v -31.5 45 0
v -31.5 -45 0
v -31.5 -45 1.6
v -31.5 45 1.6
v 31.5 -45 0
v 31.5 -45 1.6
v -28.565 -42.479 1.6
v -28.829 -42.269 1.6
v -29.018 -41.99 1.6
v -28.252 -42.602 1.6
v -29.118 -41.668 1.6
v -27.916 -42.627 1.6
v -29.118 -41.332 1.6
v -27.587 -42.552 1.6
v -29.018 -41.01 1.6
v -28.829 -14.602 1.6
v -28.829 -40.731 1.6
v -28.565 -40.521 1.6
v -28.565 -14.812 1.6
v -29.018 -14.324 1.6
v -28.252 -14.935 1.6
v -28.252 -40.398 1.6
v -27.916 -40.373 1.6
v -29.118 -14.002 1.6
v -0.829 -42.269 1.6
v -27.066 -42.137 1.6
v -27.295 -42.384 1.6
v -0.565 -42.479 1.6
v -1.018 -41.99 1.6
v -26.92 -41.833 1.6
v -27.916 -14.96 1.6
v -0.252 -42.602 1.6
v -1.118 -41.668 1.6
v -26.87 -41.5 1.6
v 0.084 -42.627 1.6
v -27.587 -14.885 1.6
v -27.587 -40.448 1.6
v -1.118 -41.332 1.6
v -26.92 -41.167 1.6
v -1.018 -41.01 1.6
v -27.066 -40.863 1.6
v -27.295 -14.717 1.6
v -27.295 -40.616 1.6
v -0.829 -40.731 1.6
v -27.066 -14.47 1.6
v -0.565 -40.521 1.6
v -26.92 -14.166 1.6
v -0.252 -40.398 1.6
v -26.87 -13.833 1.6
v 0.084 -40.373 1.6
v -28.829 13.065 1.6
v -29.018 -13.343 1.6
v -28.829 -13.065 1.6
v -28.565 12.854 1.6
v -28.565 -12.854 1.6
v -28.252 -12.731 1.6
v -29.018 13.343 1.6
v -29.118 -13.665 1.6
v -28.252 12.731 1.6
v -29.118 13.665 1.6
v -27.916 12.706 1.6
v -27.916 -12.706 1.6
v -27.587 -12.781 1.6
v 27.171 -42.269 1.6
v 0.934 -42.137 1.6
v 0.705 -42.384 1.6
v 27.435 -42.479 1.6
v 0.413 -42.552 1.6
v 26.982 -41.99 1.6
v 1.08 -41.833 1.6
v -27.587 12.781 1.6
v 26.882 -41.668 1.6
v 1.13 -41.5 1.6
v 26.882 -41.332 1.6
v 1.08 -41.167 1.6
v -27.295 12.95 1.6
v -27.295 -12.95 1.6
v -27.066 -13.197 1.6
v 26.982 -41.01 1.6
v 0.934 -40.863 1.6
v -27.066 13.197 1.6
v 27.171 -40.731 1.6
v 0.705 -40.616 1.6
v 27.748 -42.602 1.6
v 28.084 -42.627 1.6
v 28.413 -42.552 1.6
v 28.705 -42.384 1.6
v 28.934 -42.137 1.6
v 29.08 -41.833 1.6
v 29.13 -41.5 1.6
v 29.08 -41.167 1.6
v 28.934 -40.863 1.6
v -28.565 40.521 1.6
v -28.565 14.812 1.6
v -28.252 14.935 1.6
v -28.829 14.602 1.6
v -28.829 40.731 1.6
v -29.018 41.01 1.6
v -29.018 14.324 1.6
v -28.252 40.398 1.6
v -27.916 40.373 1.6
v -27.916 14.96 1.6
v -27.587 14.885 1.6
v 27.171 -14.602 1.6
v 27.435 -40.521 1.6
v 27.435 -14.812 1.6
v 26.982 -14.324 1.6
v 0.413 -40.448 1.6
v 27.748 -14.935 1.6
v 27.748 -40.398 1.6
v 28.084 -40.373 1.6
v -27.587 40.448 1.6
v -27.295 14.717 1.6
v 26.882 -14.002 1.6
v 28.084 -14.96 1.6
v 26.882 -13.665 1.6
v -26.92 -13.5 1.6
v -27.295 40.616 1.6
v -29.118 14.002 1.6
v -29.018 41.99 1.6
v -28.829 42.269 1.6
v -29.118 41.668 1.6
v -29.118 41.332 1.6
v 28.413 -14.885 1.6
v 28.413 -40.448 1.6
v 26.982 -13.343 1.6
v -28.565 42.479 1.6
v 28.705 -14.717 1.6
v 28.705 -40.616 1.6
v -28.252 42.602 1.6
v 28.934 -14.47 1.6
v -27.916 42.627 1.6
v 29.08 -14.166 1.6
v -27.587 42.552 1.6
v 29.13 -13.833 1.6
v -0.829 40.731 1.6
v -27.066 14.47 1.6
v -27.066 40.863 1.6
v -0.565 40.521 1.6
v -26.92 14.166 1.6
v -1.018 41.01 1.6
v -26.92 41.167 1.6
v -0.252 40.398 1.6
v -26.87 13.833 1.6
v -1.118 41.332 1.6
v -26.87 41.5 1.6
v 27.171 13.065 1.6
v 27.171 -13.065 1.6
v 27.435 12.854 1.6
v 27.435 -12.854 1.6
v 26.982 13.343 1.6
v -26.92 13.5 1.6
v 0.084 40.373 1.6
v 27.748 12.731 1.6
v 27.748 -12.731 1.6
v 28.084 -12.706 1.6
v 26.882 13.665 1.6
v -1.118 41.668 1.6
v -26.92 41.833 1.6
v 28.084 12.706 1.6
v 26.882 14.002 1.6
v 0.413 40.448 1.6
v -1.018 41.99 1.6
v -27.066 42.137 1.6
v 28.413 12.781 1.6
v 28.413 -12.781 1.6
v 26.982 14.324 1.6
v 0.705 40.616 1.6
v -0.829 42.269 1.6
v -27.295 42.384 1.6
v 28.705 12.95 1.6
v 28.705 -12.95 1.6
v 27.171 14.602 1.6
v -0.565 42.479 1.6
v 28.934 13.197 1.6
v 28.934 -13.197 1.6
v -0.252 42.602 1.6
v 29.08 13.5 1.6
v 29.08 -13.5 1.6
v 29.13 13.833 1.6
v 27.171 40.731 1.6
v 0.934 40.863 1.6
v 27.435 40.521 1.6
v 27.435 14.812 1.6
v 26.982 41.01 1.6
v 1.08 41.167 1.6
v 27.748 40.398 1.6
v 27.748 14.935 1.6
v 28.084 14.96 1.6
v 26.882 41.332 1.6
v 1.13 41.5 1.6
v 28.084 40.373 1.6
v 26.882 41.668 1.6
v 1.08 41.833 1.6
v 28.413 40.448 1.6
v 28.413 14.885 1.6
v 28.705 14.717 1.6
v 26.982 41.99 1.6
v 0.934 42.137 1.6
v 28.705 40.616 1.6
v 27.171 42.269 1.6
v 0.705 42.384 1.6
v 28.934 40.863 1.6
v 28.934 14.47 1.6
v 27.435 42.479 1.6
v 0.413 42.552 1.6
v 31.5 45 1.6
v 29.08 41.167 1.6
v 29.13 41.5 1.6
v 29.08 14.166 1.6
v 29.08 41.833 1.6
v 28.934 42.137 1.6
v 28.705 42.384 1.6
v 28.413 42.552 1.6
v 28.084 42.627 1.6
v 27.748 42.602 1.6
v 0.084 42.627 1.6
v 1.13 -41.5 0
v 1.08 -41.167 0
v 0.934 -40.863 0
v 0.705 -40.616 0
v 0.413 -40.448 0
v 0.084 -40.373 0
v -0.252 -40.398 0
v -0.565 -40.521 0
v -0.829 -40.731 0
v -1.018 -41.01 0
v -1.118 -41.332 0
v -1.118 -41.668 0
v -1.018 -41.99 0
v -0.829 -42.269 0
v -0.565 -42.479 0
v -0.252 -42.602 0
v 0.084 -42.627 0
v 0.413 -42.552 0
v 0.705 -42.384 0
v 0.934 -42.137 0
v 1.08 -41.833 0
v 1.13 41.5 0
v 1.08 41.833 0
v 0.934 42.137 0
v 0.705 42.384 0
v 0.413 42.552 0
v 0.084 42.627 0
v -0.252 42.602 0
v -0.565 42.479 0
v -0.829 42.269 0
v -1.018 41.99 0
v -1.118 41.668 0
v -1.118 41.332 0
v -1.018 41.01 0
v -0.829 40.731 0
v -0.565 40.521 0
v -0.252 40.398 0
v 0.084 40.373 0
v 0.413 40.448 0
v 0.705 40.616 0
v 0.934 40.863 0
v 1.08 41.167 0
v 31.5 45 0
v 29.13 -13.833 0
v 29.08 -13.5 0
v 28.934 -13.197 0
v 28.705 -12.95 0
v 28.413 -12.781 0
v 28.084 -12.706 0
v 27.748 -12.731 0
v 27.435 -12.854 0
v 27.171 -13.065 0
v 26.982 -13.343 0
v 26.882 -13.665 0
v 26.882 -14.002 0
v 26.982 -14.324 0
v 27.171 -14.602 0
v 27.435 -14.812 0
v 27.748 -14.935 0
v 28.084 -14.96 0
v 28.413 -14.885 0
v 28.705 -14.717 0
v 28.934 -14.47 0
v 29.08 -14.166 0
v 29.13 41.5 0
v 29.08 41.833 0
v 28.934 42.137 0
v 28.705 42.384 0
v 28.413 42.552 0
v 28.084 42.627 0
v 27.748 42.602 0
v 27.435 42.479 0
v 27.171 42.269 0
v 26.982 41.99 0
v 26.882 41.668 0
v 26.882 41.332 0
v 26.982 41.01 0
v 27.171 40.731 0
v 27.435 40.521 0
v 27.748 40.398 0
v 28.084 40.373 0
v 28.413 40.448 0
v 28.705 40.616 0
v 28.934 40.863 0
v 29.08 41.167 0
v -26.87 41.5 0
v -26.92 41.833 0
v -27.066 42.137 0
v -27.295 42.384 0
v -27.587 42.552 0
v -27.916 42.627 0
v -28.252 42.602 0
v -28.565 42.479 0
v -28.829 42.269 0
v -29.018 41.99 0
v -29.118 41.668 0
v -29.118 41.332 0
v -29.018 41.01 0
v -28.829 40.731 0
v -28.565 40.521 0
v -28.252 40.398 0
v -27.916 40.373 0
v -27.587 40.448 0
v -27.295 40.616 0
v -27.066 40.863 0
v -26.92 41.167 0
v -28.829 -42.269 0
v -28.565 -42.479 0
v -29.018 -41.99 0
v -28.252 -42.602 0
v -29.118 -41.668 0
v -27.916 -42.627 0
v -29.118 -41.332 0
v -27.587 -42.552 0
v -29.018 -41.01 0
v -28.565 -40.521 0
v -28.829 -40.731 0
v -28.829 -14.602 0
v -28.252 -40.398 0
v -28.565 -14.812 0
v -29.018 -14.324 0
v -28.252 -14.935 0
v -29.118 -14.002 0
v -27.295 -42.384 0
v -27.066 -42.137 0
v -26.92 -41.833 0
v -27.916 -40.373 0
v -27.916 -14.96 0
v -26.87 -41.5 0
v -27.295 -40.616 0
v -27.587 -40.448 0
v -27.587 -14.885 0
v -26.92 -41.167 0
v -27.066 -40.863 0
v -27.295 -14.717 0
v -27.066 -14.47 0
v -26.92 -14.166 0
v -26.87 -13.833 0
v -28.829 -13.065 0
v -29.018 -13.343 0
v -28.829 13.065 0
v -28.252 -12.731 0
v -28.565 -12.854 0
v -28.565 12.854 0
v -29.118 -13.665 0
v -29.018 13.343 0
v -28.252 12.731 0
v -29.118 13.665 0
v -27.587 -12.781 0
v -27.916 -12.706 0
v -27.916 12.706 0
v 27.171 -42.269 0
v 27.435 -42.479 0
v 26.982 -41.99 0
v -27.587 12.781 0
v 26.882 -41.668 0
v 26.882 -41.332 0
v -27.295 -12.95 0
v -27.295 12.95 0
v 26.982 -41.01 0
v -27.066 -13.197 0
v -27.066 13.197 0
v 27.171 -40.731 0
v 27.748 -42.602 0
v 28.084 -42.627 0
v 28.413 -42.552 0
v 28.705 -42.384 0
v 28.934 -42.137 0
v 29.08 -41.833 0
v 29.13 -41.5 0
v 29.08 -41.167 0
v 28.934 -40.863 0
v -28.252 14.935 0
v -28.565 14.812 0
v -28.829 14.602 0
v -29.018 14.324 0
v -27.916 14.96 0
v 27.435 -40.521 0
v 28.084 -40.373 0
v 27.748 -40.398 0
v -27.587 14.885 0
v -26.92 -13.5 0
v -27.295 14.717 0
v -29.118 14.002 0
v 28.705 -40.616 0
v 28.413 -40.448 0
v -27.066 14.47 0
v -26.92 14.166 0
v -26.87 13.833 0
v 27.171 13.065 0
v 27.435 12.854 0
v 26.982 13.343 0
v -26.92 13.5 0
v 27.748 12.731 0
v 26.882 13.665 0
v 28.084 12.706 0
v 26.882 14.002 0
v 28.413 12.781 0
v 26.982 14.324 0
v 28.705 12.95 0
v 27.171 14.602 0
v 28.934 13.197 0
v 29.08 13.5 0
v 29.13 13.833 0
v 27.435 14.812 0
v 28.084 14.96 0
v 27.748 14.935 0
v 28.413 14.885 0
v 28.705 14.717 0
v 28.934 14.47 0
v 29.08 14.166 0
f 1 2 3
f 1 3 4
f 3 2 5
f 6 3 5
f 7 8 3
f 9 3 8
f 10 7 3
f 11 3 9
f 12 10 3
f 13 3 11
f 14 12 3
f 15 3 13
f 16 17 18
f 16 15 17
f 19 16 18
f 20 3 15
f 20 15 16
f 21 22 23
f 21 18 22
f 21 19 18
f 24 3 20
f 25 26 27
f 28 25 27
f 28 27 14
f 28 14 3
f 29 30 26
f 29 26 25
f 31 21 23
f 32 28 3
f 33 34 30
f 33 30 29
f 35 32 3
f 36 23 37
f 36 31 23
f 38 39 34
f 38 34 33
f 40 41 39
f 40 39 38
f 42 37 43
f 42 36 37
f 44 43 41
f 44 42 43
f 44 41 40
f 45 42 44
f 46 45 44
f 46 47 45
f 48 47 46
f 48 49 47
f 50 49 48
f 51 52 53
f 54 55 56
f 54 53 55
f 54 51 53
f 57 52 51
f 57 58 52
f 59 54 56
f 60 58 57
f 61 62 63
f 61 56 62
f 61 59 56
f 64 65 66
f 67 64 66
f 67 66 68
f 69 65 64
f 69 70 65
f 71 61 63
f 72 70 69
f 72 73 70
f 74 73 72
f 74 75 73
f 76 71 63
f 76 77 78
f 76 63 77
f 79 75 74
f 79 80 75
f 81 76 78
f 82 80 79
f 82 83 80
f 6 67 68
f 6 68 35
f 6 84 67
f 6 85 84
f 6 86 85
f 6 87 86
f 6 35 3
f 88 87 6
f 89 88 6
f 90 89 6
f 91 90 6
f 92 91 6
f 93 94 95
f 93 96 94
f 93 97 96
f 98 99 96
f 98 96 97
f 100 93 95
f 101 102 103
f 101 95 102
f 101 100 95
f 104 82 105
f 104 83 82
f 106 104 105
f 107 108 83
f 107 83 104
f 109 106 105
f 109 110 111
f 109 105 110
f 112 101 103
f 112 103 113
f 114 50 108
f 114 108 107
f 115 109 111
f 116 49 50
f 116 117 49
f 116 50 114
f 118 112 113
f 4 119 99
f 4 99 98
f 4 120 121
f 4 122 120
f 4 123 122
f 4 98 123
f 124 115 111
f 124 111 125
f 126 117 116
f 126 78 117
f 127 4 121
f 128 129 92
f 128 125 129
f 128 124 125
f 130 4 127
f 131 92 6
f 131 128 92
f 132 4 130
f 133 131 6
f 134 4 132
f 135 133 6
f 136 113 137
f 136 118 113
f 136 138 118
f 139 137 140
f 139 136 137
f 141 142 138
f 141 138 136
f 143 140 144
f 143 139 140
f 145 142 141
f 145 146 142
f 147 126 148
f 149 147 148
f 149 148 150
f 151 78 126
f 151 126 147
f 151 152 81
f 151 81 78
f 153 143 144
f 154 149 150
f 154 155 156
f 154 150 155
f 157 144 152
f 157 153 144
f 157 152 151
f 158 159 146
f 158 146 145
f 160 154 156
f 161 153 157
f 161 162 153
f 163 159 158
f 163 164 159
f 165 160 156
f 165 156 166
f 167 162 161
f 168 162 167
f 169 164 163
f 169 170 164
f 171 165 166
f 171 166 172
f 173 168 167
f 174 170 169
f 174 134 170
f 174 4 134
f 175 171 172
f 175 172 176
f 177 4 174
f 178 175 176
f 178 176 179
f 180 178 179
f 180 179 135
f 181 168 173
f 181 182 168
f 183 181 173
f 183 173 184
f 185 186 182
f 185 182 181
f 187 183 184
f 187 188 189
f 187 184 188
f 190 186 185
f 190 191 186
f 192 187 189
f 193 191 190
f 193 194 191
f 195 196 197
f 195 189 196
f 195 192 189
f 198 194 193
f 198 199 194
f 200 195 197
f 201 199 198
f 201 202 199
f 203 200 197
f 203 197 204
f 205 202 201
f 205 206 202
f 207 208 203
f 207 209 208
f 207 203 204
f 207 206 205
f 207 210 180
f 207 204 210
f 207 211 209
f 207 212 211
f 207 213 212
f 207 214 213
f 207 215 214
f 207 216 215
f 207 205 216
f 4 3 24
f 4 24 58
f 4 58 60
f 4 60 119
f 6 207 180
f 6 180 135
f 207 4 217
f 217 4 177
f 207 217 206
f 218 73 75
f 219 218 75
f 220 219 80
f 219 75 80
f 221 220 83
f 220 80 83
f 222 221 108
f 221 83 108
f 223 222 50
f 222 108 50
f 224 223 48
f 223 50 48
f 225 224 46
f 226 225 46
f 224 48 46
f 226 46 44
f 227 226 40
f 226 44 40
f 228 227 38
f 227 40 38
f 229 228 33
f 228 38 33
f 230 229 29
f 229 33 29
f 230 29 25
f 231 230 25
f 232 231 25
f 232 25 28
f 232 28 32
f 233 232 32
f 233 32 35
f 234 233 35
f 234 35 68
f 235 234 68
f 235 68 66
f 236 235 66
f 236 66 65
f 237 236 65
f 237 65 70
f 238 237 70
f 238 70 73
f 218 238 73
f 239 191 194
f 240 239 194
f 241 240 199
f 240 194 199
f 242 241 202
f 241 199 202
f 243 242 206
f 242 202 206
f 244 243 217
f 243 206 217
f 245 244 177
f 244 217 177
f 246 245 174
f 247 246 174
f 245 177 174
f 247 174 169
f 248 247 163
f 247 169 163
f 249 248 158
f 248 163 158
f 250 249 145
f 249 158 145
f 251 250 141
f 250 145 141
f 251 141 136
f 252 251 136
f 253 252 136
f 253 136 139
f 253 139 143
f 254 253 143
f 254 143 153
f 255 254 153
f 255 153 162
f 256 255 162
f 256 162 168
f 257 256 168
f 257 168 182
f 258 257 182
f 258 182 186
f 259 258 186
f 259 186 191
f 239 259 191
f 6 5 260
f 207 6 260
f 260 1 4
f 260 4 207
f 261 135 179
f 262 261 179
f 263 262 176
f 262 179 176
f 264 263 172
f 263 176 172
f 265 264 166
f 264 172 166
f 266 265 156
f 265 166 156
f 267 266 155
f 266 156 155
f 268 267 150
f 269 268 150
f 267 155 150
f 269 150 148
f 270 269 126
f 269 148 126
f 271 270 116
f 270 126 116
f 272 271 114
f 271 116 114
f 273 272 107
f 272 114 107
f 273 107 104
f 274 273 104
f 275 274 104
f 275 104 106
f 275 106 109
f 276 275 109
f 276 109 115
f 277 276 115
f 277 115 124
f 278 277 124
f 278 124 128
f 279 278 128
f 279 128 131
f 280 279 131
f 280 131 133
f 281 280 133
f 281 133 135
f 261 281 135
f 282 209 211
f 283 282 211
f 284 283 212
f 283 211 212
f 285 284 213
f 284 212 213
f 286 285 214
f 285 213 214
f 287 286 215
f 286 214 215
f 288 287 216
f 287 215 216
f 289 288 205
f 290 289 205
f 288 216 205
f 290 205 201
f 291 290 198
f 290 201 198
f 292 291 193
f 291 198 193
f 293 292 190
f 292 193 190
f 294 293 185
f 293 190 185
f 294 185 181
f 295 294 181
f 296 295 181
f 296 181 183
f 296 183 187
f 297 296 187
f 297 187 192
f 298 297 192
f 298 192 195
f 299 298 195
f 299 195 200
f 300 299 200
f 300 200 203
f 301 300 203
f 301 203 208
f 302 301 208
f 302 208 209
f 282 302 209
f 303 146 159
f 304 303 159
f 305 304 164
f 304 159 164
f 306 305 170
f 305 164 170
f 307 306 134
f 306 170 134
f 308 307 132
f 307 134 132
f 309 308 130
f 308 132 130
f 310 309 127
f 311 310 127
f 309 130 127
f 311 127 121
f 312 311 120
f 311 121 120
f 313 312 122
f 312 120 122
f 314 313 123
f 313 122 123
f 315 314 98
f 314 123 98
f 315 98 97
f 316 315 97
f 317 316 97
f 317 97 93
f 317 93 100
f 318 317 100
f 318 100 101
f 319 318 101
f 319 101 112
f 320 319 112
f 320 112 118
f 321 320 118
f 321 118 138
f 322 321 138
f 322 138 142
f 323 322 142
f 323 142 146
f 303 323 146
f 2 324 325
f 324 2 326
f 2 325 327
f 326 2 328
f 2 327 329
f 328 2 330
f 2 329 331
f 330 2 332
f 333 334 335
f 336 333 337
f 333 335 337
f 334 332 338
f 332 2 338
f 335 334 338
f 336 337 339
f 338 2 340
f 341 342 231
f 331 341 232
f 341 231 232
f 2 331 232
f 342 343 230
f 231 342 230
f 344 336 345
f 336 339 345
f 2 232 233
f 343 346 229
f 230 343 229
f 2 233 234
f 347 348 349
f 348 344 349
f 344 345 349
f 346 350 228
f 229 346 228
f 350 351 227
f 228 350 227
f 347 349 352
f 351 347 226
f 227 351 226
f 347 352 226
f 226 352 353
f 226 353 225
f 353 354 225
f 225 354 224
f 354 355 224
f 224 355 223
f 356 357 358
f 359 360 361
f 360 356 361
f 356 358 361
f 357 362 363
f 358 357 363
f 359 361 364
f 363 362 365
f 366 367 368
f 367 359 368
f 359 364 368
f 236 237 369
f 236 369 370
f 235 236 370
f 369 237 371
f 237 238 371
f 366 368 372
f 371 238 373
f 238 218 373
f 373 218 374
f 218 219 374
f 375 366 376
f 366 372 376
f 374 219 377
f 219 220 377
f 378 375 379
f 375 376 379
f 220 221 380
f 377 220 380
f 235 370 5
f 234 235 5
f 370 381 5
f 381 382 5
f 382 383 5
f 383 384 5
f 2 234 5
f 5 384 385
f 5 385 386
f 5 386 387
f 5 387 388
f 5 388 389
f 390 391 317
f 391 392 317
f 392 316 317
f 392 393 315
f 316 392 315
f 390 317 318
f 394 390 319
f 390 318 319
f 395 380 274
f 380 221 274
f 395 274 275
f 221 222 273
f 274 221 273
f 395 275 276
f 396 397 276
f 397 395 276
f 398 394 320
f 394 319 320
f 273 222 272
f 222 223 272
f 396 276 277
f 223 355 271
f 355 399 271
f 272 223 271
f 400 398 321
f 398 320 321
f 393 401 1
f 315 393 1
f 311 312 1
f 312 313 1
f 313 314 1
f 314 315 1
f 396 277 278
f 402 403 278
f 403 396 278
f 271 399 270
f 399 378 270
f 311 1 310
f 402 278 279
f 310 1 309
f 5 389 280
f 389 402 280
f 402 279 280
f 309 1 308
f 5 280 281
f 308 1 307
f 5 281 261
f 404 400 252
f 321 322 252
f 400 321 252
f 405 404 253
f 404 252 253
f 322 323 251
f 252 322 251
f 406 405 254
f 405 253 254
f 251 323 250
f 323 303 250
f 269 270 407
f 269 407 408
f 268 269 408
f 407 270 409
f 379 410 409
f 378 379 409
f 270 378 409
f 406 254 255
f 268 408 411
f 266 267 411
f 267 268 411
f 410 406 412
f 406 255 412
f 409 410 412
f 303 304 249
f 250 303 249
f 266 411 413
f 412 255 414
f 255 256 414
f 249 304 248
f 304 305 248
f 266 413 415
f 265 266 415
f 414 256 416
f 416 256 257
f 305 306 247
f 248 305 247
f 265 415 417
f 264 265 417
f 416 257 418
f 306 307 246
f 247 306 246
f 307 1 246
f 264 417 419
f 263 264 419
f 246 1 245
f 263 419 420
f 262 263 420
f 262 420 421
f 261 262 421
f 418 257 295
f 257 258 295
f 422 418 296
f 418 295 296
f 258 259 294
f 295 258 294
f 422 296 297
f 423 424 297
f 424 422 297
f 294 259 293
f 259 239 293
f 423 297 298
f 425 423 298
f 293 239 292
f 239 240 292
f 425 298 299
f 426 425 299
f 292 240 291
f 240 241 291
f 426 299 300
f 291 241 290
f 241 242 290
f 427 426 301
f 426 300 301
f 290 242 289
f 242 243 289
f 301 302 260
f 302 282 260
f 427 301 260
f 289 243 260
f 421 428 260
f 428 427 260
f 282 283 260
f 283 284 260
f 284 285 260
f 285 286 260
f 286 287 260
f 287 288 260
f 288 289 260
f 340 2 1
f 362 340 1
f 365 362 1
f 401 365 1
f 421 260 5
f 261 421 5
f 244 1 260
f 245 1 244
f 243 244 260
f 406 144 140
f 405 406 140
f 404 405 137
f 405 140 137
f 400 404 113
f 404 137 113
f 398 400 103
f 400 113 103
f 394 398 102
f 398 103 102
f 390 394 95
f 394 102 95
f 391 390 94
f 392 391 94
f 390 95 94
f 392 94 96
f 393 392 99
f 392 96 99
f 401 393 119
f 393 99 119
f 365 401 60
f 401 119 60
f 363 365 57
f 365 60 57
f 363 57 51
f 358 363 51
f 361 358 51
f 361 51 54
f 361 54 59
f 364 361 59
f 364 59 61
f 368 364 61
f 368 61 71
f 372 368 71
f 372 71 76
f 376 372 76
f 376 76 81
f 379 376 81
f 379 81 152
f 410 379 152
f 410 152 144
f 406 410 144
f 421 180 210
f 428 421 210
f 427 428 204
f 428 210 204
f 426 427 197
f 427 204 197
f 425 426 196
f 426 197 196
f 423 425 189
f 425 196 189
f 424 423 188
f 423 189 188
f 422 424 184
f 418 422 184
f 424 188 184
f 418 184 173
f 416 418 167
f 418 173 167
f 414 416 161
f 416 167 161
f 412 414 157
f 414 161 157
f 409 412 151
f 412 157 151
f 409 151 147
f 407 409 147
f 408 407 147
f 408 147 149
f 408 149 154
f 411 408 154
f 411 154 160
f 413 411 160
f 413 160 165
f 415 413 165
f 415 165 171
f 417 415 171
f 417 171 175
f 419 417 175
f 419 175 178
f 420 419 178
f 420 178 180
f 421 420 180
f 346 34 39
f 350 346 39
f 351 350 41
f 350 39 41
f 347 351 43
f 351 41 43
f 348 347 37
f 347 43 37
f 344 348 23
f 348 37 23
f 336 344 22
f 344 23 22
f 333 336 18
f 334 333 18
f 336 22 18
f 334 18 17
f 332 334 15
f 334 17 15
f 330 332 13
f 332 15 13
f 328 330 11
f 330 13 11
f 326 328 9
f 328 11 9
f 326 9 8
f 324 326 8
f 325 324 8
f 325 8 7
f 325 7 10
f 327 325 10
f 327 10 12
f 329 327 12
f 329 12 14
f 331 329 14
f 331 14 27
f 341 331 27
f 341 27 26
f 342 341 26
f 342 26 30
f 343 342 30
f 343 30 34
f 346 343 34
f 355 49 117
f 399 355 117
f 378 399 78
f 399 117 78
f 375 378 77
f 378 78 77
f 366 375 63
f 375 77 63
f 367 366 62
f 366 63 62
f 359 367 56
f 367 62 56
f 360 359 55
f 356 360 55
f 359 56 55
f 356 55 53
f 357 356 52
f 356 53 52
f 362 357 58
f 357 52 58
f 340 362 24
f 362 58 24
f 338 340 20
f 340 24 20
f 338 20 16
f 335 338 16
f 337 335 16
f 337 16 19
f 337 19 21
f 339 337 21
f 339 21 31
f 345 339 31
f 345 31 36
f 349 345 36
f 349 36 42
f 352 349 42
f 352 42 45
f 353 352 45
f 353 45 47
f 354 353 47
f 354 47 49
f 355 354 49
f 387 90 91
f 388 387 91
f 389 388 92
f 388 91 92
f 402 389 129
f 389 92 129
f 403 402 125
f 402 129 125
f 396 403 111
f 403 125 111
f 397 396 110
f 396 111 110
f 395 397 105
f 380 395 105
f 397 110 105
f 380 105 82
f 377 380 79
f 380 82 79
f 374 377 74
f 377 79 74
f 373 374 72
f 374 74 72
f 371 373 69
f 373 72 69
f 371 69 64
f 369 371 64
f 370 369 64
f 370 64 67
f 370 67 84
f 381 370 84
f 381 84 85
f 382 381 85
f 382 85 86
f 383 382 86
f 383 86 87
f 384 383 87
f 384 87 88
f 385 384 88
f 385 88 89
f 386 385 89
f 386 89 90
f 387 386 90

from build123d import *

# Parameters (mm, degrees)
F0_W     = 63
F0_H     = 90
F1_DEPTH = 1.6
F2_R     = 1.1303
F3_DEPTH = 25


with BuildPart() as f1:
    # F0 (on Top) → F1 (new body)
    with BuildSketch(Plane.XY):
        Rectangle(F0_W, F0_H)
    extrude(amount=F1_DEPTH)

    # F2 (on face) → F3 (cut)
    with BuildSketch(Plane.XY.offset(1.6)):
        with Locations((-28, 41.5)):
            Circle(F2_R)
        with Locations((0, 41.5)):
            Circle(F2_R)
        with Locations((28, 41.5)):
            Circle(F2_R)
        with Locations((28, 13.833333)):
            Circle(F2_R)
        with Locations((28, -13.833333)):
            Circle(F2_R)
        with Locations((0, -41.5)):
            Circle(F2_R)
        with Locations((-28, -41.5)):
            Circle(F2_R)
        with Locations((-28, -13.833333)):
            Circle(F2_R)
        with Locations((-28, 13.833333)):
            Circle(F2_R)
        with Locations((28, -41.5)):
            Circle(F2_R)
    extrude(amount=-F3_DEPTH, mode=Mode.SUBTRACT)


solid = f1.part
